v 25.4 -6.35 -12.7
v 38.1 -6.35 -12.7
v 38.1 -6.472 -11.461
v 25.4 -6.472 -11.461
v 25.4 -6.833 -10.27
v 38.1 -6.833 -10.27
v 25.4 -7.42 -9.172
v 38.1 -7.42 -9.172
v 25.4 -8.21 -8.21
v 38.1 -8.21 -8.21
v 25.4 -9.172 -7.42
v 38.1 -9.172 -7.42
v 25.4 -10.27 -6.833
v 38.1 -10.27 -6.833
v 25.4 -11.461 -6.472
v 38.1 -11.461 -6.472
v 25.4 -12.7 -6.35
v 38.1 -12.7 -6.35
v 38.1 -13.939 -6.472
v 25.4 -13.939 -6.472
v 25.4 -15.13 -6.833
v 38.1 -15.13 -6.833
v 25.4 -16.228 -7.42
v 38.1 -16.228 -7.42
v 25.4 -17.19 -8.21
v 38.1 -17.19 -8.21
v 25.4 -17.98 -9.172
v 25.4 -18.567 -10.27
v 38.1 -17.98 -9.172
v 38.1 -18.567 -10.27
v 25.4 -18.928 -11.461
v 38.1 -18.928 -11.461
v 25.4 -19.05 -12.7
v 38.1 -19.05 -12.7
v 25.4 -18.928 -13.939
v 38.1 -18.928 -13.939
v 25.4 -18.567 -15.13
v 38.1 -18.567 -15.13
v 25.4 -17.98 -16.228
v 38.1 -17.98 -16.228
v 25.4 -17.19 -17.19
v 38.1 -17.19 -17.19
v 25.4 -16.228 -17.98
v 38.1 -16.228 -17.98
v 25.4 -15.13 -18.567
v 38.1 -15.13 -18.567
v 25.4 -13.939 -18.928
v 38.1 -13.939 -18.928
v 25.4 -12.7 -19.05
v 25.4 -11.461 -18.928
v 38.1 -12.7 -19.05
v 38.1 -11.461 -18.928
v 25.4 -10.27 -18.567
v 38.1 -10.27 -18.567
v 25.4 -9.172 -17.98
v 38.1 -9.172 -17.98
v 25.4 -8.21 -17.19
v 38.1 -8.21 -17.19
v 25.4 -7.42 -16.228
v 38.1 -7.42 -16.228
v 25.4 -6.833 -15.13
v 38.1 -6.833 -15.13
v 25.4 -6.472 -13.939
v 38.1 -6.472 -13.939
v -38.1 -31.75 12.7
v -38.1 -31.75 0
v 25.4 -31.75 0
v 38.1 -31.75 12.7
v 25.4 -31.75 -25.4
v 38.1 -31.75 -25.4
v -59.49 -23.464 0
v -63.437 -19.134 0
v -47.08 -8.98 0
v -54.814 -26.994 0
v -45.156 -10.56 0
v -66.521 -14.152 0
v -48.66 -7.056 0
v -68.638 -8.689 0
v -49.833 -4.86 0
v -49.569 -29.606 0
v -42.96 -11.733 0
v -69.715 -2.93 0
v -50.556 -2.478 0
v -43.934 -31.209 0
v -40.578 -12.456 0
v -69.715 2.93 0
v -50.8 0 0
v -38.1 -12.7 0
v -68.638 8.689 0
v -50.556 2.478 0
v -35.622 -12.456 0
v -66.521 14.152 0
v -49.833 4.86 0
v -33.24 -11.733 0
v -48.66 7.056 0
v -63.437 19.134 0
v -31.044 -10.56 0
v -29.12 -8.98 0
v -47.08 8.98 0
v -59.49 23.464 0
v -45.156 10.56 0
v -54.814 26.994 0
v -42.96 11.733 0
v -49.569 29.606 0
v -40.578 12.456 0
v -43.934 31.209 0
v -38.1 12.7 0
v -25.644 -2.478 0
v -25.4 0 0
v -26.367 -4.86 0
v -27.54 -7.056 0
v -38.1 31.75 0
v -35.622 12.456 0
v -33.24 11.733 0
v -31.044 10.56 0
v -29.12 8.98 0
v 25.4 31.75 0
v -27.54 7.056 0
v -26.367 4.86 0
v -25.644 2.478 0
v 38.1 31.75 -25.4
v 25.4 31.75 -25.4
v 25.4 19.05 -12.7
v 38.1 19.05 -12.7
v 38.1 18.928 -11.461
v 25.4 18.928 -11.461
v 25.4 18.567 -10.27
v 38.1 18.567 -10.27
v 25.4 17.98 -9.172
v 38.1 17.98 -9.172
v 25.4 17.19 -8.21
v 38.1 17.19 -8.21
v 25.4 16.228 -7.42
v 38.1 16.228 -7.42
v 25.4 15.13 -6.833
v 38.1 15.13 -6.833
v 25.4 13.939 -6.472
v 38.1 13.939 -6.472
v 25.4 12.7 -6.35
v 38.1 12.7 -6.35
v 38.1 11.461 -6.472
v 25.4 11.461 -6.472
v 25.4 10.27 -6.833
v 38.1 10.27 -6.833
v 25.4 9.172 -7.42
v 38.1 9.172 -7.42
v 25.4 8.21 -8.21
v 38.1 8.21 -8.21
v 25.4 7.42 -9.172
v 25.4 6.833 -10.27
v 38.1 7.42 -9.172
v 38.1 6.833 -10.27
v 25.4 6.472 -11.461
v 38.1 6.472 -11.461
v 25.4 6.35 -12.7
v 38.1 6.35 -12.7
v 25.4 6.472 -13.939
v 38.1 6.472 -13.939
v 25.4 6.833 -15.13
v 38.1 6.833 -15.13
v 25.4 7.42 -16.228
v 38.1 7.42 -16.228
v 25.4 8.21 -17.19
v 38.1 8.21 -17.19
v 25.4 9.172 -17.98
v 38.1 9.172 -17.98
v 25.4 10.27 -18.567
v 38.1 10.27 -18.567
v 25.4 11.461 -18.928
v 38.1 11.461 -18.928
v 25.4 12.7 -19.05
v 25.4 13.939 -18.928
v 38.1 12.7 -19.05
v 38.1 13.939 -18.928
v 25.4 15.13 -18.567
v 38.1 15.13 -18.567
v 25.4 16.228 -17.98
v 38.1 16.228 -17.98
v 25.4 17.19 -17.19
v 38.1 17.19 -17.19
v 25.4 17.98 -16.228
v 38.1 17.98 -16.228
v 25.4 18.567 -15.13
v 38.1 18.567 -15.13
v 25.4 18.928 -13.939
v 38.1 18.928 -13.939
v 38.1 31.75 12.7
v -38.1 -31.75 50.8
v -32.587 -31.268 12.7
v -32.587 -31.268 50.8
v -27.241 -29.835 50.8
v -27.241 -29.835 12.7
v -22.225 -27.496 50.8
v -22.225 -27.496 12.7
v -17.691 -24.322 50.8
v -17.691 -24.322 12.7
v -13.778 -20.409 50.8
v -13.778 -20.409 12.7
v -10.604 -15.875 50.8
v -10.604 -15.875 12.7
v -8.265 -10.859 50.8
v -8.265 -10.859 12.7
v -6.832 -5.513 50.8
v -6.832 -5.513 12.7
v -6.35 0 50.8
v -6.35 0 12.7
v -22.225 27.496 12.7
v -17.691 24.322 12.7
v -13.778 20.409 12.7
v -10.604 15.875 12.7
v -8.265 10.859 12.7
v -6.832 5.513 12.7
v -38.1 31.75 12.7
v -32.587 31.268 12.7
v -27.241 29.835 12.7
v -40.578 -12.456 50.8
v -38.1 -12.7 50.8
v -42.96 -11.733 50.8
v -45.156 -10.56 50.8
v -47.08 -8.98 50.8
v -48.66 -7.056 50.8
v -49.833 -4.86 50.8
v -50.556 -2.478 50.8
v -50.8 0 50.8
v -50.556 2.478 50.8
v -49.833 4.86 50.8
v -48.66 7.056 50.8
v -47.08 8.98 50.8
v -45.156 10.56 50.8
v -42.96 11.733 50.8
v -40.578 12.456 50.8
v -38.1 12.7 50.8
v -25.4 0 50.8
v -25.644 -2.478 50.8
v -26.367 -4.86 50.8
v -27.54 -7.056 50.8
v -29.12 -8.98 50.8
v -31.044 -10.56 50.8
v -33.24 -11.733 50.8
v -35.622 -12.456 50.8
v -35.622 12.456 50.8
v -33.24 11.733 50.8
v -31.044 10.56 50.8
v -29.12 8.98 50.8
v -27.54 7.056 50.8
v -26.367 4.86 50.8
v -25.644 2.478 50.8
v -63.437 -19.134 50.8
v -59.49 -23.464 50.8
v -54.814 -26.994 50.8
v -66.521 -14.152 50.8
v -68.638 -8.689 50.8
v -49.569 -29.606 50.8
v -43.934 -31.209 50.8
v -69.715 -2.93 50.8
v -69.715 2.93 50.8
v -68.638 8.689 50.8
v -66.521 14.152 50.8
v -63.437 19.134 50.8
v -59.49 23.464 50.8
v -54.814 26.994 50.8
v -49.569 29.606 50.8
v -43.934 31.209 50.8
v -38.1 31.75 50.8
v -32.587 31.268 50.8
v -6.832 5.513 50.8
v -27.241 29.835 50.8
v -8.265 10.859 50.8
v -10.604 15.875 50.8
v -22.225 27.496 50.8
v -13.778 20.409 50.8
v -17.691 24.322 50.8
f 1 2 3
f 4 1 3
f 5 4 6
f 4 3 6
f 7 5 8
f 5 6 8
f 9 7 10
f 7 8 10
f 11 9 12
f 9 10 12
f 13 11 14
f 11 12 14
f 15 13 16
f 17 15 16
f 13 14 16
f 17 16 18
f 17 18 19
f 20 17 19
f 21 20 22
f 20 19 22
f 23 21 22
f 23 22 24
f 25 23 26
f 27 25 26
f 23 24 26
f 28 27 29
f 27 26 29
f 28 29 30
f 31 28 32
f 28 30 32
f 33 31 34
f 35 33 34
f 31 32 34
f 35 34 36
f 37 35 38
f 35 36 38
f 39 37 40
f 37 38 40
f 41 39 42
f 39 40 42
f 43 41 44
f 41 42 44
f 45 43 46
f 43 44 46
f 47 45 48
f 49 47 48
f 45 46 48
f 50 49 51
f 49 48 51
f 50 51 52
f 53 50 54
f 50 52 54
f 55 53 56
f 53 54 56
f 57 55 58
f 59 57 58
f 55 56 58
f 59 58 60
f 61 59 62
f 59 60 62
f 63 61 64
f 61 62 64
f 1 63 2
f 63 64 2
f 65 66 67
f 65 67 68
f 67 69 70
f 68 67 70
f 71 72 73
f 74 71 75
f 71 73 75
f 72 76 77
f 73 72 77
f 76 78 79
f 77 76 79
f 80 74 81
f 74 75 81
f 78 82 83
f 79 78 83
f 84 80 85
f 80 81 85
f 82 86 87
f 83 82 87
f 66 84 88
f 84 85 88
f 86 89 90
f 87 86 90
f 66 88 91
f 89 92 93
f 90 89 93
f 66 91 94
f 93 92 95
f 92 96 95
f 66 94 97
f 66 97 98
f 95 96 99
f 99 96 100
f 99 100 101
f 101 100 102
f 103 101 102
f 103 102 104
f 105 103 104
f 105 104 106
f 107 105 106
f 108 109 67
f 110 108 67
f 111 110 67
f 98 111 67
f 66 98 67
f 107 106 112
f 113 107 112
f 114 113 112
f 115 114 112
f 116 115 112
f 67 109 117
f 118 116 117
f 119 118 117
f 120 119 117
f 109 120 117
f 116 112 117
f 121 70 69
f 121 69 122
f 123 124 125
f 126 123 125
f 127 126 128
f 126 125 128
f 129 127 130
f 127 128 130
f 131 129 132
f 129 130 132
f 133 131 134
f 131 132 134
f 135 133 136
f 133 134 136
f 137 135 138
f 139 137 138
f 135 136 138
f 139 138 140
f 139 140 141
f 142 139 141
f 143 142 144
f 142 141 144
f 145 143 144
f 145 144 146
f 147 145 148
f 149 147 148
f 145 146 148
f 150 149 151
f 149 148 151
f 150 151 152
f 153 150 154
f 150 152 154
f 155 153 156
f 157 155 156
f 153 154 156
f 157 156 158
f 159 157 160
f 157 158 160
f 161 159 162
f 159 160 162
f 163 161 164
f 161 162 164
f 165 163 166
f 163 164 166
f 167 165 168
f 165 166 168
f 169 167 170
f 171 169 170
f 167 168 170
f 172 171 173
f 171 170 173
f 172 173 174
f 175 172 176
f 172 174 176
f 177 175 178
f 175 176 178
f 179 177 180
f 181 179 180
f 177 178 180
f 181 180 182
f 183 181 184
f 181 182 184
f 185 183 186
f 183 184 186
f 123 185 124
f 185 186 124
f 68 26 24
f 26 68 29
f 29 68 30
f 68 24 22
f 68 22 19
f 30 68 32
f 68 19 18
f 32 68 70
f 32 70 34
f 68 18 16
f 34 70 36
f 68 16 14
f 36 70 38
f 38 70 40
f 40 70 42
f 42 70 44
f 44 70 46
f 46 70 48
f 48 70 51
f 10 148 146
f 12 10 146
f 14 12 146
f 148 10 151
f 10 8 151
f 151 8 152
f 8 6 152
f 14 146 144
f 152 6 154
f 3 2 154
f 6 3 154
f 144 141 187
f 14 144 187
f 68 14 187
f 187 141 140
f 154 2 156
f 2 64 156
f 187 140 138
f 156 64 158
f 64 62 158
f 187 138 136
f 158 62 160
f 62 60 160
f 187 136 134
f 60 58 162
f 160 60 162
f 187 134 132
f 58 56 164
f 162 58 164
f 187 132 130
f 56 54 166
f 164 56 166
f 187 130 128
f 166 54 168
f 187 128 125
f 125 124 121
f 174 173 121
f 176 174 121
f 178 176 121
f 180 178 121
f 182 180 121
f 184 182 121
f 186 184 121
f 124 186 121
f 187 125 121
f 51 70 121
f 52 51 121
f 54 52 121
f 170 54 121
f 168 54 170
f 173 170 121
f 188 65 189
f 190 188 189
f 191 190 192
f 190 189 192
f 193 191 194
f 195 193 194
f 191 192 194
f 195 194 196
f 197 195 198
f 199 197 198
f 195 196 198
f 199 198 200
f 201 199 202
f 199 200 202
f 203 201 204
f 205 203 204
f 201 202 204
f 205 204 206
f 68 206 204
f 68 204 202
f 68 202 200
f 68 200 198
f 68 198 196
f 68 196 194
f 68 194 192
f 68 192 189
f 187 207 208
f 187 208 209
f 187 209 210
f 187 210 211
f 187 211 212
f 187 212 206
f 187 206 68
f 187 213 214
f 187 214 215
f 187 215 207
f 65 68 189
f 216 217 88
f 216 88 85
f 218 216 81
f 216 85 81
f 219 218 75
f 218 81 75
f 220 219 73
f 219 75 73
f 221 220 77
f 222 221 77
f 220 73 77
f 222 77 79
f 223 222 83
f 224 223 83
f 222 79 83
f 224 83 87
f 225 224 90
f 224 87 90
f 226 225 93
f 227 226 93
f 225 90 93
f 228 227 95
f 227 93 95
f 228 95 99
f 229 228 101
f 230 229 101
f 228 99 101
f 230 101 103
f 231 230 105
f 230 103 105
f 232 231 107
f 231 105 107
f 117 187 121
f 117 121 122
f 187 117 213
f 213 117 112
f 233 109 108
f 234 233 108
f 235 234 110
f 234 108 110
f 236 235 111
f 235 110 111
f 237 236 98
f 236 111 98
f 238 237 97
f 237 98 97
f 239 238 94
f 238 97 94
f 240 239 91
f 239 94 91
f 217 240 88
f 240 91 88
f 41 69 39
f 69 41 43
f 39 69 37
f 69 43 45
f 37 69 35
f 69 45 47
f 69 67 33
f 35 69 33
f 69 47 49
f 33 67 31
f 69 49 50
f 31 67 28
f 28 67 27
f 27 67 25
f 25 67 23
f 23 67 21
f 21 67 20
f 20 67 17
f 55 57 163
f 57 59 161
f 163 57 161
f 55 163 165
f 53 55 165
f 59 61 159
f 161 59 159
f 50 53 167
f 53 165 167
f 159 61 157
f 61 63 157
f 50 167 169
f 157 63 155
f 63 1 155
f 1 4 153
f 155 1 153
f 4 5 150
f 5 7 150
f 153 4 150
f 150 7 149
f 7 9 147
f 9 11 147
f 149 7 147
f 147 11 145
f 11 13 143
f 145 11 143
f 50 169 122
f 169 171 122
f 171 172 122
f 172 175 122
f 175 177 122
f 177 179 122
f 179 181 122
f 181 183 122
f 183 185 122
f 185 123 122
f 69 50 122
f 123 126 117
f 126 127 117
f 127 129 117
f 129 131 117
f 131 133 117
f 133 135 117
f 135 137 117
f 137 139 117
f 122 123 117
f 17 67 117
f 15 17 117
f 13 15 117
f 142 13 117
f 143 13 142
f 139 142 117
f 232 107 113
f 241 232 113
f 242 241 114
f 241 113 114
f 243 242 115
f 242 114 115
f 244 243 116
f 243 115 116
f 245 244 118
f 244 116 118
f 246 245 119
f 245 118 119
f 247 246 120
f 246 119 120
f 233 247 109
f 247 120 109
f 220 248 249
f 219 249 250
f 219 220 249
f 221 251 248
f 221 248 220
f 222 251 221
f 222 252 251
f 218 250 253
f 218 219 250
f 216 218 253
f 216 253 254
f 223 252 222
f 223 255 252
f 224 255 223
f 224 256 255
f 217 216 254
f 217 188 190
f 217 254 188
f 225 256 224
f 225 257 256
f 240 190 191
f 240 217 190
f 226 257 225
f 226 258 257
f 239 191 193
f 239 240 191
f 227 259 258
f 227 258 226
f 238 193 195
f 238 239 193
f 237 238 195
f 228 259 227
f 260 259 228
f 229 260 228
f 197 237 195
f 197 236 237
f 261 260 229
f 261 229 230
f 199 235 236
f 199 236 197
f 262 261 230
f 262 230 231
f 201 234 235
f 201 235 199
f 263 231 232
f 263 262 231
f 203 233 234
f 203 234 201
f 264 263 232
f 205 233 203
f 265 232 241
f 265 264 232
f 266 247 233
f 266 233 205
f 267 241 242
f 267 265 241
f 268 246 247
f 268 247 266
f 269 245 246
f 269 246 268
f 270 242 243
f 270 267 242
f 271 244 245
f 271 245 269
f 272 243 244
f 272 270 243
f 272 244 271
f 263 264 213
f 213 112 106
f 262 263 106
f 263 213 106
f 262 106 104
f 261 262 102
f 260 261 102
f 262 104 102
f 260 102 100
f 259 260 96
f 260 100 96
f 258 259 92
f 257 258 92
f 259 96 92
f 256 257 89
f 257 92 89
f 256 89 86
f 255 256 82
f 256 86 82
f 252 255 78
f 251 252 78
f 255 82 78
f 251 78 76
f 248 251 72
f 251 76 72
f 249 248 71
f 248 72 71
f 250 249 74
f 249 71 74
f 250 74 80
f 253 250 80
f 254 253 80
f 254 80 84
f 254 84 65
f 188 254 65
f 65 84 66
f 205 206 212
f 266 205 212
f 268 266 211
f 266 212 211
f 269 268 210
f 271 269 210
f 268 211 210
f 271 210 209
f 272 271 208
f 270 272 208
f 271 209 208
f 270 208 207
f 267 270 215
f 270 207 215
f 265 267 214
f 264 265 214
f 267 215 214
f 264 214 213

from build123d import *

# Parameters (mm, degrees)
F1_DEPTH = 12.7
F2_DEPTH = 50.8
F3_W     = 31.75
F3_H     = 25.4
F3_R     = 6.35
F4_DEPTH = 12.7


with BuildPart() as f1:
    # F0 (on Top) → F1 (new body)
    with BuildSketch(Plane.XY):
        with BuildLine():
            Line((-38.1, -31.75), (38.1, -31.75))
            Line((38.1, -31.75), (38.1, 31.75))
            Line((38.1, 31.75), (-38.1, 31.75))
            ThreePointArc((-38.1, 31.75), (-15.64936, 22.45064), (-6.35, 0))
            ThreePointArc((-6.35, 0), (-15.64936, -22.45064), (-38.1, -31.75))
        make_face()
        with BuildLine():
            ThreePointArc((-38.1, 31.75), (-69.85, 0), (-38.1, -31.75))
            Line((-38.1, -31.75), (-38.1, -12.7))
            ThreePointArc((-38.1, -12.7), (-50.8, 0), (-38.1, 12.7))
            Line((-38.1, 12.7), (-38.1, 31.75))
        make_face()
    extrude(amount=F1_DEPTH)

    # F0 (on Top) → F2 (join)
    with BuildSketch(Plane.XY):
        with BuildLine():
            Line((-38.1, -12.7), (-38.1, -31.75))
            ThreePointArc((-38.1, -31.75), (-15.64936, -22.45064), (-6.35, 0))
            ThreePointArc((-6.35, 0), (-15.64936, 22.45064), (-38.1, 31.75))
            Line((-38.1, 31.75), (-38.1, 12.7))
            ThreePointArc((-38.1, 12.7), (-29.119744, 8.980256), (-25.4, 0))
            ThreePointArc((-25.4, 0), (-29.119744, -8.980256), (-38.1, -12.7))
        make_face()
        with BuildLine():
            ThreePointArc((-38.1, 31.75), (-69.85, 0), (-38.1, -31.75))
            Line((-38.1, -31.75), (-38.1, -12.7))
            ThreePointArc((-38.1, -12.7), (-50.8, 0), (-38.1, 12.7))
            Line((-38.1, 12.7), (-38.1, 31.75))
        make_face()
    extrude(amount=F2_DEPTH)

    # F3 (on face) → F4 (join)
    with BuildSketch(Plane.YZ.offset(38.1)):
        Polygon((31.75, 12.7), (-31.75, 12.7), (-31.75, 0), (0, 0), (31.75, 0), align=None)
        with Locations((-15.875, -12.7)):
            Rectangle(F3_W, F3_H)
        with Locations((-12.7, -12.7)):
            Circle(F3_R, mode=Mode.SUBTRACT)
        with Locations((15.875, -12.7)):
            Rectangle(F3_W, F3_H)
        with Locations((12.7, -12.7)):
            Circle(F3_R, mode=Mode.SUBTRACT)
    extrude(amount=-F4_DEPTH)


solid = f1.part
